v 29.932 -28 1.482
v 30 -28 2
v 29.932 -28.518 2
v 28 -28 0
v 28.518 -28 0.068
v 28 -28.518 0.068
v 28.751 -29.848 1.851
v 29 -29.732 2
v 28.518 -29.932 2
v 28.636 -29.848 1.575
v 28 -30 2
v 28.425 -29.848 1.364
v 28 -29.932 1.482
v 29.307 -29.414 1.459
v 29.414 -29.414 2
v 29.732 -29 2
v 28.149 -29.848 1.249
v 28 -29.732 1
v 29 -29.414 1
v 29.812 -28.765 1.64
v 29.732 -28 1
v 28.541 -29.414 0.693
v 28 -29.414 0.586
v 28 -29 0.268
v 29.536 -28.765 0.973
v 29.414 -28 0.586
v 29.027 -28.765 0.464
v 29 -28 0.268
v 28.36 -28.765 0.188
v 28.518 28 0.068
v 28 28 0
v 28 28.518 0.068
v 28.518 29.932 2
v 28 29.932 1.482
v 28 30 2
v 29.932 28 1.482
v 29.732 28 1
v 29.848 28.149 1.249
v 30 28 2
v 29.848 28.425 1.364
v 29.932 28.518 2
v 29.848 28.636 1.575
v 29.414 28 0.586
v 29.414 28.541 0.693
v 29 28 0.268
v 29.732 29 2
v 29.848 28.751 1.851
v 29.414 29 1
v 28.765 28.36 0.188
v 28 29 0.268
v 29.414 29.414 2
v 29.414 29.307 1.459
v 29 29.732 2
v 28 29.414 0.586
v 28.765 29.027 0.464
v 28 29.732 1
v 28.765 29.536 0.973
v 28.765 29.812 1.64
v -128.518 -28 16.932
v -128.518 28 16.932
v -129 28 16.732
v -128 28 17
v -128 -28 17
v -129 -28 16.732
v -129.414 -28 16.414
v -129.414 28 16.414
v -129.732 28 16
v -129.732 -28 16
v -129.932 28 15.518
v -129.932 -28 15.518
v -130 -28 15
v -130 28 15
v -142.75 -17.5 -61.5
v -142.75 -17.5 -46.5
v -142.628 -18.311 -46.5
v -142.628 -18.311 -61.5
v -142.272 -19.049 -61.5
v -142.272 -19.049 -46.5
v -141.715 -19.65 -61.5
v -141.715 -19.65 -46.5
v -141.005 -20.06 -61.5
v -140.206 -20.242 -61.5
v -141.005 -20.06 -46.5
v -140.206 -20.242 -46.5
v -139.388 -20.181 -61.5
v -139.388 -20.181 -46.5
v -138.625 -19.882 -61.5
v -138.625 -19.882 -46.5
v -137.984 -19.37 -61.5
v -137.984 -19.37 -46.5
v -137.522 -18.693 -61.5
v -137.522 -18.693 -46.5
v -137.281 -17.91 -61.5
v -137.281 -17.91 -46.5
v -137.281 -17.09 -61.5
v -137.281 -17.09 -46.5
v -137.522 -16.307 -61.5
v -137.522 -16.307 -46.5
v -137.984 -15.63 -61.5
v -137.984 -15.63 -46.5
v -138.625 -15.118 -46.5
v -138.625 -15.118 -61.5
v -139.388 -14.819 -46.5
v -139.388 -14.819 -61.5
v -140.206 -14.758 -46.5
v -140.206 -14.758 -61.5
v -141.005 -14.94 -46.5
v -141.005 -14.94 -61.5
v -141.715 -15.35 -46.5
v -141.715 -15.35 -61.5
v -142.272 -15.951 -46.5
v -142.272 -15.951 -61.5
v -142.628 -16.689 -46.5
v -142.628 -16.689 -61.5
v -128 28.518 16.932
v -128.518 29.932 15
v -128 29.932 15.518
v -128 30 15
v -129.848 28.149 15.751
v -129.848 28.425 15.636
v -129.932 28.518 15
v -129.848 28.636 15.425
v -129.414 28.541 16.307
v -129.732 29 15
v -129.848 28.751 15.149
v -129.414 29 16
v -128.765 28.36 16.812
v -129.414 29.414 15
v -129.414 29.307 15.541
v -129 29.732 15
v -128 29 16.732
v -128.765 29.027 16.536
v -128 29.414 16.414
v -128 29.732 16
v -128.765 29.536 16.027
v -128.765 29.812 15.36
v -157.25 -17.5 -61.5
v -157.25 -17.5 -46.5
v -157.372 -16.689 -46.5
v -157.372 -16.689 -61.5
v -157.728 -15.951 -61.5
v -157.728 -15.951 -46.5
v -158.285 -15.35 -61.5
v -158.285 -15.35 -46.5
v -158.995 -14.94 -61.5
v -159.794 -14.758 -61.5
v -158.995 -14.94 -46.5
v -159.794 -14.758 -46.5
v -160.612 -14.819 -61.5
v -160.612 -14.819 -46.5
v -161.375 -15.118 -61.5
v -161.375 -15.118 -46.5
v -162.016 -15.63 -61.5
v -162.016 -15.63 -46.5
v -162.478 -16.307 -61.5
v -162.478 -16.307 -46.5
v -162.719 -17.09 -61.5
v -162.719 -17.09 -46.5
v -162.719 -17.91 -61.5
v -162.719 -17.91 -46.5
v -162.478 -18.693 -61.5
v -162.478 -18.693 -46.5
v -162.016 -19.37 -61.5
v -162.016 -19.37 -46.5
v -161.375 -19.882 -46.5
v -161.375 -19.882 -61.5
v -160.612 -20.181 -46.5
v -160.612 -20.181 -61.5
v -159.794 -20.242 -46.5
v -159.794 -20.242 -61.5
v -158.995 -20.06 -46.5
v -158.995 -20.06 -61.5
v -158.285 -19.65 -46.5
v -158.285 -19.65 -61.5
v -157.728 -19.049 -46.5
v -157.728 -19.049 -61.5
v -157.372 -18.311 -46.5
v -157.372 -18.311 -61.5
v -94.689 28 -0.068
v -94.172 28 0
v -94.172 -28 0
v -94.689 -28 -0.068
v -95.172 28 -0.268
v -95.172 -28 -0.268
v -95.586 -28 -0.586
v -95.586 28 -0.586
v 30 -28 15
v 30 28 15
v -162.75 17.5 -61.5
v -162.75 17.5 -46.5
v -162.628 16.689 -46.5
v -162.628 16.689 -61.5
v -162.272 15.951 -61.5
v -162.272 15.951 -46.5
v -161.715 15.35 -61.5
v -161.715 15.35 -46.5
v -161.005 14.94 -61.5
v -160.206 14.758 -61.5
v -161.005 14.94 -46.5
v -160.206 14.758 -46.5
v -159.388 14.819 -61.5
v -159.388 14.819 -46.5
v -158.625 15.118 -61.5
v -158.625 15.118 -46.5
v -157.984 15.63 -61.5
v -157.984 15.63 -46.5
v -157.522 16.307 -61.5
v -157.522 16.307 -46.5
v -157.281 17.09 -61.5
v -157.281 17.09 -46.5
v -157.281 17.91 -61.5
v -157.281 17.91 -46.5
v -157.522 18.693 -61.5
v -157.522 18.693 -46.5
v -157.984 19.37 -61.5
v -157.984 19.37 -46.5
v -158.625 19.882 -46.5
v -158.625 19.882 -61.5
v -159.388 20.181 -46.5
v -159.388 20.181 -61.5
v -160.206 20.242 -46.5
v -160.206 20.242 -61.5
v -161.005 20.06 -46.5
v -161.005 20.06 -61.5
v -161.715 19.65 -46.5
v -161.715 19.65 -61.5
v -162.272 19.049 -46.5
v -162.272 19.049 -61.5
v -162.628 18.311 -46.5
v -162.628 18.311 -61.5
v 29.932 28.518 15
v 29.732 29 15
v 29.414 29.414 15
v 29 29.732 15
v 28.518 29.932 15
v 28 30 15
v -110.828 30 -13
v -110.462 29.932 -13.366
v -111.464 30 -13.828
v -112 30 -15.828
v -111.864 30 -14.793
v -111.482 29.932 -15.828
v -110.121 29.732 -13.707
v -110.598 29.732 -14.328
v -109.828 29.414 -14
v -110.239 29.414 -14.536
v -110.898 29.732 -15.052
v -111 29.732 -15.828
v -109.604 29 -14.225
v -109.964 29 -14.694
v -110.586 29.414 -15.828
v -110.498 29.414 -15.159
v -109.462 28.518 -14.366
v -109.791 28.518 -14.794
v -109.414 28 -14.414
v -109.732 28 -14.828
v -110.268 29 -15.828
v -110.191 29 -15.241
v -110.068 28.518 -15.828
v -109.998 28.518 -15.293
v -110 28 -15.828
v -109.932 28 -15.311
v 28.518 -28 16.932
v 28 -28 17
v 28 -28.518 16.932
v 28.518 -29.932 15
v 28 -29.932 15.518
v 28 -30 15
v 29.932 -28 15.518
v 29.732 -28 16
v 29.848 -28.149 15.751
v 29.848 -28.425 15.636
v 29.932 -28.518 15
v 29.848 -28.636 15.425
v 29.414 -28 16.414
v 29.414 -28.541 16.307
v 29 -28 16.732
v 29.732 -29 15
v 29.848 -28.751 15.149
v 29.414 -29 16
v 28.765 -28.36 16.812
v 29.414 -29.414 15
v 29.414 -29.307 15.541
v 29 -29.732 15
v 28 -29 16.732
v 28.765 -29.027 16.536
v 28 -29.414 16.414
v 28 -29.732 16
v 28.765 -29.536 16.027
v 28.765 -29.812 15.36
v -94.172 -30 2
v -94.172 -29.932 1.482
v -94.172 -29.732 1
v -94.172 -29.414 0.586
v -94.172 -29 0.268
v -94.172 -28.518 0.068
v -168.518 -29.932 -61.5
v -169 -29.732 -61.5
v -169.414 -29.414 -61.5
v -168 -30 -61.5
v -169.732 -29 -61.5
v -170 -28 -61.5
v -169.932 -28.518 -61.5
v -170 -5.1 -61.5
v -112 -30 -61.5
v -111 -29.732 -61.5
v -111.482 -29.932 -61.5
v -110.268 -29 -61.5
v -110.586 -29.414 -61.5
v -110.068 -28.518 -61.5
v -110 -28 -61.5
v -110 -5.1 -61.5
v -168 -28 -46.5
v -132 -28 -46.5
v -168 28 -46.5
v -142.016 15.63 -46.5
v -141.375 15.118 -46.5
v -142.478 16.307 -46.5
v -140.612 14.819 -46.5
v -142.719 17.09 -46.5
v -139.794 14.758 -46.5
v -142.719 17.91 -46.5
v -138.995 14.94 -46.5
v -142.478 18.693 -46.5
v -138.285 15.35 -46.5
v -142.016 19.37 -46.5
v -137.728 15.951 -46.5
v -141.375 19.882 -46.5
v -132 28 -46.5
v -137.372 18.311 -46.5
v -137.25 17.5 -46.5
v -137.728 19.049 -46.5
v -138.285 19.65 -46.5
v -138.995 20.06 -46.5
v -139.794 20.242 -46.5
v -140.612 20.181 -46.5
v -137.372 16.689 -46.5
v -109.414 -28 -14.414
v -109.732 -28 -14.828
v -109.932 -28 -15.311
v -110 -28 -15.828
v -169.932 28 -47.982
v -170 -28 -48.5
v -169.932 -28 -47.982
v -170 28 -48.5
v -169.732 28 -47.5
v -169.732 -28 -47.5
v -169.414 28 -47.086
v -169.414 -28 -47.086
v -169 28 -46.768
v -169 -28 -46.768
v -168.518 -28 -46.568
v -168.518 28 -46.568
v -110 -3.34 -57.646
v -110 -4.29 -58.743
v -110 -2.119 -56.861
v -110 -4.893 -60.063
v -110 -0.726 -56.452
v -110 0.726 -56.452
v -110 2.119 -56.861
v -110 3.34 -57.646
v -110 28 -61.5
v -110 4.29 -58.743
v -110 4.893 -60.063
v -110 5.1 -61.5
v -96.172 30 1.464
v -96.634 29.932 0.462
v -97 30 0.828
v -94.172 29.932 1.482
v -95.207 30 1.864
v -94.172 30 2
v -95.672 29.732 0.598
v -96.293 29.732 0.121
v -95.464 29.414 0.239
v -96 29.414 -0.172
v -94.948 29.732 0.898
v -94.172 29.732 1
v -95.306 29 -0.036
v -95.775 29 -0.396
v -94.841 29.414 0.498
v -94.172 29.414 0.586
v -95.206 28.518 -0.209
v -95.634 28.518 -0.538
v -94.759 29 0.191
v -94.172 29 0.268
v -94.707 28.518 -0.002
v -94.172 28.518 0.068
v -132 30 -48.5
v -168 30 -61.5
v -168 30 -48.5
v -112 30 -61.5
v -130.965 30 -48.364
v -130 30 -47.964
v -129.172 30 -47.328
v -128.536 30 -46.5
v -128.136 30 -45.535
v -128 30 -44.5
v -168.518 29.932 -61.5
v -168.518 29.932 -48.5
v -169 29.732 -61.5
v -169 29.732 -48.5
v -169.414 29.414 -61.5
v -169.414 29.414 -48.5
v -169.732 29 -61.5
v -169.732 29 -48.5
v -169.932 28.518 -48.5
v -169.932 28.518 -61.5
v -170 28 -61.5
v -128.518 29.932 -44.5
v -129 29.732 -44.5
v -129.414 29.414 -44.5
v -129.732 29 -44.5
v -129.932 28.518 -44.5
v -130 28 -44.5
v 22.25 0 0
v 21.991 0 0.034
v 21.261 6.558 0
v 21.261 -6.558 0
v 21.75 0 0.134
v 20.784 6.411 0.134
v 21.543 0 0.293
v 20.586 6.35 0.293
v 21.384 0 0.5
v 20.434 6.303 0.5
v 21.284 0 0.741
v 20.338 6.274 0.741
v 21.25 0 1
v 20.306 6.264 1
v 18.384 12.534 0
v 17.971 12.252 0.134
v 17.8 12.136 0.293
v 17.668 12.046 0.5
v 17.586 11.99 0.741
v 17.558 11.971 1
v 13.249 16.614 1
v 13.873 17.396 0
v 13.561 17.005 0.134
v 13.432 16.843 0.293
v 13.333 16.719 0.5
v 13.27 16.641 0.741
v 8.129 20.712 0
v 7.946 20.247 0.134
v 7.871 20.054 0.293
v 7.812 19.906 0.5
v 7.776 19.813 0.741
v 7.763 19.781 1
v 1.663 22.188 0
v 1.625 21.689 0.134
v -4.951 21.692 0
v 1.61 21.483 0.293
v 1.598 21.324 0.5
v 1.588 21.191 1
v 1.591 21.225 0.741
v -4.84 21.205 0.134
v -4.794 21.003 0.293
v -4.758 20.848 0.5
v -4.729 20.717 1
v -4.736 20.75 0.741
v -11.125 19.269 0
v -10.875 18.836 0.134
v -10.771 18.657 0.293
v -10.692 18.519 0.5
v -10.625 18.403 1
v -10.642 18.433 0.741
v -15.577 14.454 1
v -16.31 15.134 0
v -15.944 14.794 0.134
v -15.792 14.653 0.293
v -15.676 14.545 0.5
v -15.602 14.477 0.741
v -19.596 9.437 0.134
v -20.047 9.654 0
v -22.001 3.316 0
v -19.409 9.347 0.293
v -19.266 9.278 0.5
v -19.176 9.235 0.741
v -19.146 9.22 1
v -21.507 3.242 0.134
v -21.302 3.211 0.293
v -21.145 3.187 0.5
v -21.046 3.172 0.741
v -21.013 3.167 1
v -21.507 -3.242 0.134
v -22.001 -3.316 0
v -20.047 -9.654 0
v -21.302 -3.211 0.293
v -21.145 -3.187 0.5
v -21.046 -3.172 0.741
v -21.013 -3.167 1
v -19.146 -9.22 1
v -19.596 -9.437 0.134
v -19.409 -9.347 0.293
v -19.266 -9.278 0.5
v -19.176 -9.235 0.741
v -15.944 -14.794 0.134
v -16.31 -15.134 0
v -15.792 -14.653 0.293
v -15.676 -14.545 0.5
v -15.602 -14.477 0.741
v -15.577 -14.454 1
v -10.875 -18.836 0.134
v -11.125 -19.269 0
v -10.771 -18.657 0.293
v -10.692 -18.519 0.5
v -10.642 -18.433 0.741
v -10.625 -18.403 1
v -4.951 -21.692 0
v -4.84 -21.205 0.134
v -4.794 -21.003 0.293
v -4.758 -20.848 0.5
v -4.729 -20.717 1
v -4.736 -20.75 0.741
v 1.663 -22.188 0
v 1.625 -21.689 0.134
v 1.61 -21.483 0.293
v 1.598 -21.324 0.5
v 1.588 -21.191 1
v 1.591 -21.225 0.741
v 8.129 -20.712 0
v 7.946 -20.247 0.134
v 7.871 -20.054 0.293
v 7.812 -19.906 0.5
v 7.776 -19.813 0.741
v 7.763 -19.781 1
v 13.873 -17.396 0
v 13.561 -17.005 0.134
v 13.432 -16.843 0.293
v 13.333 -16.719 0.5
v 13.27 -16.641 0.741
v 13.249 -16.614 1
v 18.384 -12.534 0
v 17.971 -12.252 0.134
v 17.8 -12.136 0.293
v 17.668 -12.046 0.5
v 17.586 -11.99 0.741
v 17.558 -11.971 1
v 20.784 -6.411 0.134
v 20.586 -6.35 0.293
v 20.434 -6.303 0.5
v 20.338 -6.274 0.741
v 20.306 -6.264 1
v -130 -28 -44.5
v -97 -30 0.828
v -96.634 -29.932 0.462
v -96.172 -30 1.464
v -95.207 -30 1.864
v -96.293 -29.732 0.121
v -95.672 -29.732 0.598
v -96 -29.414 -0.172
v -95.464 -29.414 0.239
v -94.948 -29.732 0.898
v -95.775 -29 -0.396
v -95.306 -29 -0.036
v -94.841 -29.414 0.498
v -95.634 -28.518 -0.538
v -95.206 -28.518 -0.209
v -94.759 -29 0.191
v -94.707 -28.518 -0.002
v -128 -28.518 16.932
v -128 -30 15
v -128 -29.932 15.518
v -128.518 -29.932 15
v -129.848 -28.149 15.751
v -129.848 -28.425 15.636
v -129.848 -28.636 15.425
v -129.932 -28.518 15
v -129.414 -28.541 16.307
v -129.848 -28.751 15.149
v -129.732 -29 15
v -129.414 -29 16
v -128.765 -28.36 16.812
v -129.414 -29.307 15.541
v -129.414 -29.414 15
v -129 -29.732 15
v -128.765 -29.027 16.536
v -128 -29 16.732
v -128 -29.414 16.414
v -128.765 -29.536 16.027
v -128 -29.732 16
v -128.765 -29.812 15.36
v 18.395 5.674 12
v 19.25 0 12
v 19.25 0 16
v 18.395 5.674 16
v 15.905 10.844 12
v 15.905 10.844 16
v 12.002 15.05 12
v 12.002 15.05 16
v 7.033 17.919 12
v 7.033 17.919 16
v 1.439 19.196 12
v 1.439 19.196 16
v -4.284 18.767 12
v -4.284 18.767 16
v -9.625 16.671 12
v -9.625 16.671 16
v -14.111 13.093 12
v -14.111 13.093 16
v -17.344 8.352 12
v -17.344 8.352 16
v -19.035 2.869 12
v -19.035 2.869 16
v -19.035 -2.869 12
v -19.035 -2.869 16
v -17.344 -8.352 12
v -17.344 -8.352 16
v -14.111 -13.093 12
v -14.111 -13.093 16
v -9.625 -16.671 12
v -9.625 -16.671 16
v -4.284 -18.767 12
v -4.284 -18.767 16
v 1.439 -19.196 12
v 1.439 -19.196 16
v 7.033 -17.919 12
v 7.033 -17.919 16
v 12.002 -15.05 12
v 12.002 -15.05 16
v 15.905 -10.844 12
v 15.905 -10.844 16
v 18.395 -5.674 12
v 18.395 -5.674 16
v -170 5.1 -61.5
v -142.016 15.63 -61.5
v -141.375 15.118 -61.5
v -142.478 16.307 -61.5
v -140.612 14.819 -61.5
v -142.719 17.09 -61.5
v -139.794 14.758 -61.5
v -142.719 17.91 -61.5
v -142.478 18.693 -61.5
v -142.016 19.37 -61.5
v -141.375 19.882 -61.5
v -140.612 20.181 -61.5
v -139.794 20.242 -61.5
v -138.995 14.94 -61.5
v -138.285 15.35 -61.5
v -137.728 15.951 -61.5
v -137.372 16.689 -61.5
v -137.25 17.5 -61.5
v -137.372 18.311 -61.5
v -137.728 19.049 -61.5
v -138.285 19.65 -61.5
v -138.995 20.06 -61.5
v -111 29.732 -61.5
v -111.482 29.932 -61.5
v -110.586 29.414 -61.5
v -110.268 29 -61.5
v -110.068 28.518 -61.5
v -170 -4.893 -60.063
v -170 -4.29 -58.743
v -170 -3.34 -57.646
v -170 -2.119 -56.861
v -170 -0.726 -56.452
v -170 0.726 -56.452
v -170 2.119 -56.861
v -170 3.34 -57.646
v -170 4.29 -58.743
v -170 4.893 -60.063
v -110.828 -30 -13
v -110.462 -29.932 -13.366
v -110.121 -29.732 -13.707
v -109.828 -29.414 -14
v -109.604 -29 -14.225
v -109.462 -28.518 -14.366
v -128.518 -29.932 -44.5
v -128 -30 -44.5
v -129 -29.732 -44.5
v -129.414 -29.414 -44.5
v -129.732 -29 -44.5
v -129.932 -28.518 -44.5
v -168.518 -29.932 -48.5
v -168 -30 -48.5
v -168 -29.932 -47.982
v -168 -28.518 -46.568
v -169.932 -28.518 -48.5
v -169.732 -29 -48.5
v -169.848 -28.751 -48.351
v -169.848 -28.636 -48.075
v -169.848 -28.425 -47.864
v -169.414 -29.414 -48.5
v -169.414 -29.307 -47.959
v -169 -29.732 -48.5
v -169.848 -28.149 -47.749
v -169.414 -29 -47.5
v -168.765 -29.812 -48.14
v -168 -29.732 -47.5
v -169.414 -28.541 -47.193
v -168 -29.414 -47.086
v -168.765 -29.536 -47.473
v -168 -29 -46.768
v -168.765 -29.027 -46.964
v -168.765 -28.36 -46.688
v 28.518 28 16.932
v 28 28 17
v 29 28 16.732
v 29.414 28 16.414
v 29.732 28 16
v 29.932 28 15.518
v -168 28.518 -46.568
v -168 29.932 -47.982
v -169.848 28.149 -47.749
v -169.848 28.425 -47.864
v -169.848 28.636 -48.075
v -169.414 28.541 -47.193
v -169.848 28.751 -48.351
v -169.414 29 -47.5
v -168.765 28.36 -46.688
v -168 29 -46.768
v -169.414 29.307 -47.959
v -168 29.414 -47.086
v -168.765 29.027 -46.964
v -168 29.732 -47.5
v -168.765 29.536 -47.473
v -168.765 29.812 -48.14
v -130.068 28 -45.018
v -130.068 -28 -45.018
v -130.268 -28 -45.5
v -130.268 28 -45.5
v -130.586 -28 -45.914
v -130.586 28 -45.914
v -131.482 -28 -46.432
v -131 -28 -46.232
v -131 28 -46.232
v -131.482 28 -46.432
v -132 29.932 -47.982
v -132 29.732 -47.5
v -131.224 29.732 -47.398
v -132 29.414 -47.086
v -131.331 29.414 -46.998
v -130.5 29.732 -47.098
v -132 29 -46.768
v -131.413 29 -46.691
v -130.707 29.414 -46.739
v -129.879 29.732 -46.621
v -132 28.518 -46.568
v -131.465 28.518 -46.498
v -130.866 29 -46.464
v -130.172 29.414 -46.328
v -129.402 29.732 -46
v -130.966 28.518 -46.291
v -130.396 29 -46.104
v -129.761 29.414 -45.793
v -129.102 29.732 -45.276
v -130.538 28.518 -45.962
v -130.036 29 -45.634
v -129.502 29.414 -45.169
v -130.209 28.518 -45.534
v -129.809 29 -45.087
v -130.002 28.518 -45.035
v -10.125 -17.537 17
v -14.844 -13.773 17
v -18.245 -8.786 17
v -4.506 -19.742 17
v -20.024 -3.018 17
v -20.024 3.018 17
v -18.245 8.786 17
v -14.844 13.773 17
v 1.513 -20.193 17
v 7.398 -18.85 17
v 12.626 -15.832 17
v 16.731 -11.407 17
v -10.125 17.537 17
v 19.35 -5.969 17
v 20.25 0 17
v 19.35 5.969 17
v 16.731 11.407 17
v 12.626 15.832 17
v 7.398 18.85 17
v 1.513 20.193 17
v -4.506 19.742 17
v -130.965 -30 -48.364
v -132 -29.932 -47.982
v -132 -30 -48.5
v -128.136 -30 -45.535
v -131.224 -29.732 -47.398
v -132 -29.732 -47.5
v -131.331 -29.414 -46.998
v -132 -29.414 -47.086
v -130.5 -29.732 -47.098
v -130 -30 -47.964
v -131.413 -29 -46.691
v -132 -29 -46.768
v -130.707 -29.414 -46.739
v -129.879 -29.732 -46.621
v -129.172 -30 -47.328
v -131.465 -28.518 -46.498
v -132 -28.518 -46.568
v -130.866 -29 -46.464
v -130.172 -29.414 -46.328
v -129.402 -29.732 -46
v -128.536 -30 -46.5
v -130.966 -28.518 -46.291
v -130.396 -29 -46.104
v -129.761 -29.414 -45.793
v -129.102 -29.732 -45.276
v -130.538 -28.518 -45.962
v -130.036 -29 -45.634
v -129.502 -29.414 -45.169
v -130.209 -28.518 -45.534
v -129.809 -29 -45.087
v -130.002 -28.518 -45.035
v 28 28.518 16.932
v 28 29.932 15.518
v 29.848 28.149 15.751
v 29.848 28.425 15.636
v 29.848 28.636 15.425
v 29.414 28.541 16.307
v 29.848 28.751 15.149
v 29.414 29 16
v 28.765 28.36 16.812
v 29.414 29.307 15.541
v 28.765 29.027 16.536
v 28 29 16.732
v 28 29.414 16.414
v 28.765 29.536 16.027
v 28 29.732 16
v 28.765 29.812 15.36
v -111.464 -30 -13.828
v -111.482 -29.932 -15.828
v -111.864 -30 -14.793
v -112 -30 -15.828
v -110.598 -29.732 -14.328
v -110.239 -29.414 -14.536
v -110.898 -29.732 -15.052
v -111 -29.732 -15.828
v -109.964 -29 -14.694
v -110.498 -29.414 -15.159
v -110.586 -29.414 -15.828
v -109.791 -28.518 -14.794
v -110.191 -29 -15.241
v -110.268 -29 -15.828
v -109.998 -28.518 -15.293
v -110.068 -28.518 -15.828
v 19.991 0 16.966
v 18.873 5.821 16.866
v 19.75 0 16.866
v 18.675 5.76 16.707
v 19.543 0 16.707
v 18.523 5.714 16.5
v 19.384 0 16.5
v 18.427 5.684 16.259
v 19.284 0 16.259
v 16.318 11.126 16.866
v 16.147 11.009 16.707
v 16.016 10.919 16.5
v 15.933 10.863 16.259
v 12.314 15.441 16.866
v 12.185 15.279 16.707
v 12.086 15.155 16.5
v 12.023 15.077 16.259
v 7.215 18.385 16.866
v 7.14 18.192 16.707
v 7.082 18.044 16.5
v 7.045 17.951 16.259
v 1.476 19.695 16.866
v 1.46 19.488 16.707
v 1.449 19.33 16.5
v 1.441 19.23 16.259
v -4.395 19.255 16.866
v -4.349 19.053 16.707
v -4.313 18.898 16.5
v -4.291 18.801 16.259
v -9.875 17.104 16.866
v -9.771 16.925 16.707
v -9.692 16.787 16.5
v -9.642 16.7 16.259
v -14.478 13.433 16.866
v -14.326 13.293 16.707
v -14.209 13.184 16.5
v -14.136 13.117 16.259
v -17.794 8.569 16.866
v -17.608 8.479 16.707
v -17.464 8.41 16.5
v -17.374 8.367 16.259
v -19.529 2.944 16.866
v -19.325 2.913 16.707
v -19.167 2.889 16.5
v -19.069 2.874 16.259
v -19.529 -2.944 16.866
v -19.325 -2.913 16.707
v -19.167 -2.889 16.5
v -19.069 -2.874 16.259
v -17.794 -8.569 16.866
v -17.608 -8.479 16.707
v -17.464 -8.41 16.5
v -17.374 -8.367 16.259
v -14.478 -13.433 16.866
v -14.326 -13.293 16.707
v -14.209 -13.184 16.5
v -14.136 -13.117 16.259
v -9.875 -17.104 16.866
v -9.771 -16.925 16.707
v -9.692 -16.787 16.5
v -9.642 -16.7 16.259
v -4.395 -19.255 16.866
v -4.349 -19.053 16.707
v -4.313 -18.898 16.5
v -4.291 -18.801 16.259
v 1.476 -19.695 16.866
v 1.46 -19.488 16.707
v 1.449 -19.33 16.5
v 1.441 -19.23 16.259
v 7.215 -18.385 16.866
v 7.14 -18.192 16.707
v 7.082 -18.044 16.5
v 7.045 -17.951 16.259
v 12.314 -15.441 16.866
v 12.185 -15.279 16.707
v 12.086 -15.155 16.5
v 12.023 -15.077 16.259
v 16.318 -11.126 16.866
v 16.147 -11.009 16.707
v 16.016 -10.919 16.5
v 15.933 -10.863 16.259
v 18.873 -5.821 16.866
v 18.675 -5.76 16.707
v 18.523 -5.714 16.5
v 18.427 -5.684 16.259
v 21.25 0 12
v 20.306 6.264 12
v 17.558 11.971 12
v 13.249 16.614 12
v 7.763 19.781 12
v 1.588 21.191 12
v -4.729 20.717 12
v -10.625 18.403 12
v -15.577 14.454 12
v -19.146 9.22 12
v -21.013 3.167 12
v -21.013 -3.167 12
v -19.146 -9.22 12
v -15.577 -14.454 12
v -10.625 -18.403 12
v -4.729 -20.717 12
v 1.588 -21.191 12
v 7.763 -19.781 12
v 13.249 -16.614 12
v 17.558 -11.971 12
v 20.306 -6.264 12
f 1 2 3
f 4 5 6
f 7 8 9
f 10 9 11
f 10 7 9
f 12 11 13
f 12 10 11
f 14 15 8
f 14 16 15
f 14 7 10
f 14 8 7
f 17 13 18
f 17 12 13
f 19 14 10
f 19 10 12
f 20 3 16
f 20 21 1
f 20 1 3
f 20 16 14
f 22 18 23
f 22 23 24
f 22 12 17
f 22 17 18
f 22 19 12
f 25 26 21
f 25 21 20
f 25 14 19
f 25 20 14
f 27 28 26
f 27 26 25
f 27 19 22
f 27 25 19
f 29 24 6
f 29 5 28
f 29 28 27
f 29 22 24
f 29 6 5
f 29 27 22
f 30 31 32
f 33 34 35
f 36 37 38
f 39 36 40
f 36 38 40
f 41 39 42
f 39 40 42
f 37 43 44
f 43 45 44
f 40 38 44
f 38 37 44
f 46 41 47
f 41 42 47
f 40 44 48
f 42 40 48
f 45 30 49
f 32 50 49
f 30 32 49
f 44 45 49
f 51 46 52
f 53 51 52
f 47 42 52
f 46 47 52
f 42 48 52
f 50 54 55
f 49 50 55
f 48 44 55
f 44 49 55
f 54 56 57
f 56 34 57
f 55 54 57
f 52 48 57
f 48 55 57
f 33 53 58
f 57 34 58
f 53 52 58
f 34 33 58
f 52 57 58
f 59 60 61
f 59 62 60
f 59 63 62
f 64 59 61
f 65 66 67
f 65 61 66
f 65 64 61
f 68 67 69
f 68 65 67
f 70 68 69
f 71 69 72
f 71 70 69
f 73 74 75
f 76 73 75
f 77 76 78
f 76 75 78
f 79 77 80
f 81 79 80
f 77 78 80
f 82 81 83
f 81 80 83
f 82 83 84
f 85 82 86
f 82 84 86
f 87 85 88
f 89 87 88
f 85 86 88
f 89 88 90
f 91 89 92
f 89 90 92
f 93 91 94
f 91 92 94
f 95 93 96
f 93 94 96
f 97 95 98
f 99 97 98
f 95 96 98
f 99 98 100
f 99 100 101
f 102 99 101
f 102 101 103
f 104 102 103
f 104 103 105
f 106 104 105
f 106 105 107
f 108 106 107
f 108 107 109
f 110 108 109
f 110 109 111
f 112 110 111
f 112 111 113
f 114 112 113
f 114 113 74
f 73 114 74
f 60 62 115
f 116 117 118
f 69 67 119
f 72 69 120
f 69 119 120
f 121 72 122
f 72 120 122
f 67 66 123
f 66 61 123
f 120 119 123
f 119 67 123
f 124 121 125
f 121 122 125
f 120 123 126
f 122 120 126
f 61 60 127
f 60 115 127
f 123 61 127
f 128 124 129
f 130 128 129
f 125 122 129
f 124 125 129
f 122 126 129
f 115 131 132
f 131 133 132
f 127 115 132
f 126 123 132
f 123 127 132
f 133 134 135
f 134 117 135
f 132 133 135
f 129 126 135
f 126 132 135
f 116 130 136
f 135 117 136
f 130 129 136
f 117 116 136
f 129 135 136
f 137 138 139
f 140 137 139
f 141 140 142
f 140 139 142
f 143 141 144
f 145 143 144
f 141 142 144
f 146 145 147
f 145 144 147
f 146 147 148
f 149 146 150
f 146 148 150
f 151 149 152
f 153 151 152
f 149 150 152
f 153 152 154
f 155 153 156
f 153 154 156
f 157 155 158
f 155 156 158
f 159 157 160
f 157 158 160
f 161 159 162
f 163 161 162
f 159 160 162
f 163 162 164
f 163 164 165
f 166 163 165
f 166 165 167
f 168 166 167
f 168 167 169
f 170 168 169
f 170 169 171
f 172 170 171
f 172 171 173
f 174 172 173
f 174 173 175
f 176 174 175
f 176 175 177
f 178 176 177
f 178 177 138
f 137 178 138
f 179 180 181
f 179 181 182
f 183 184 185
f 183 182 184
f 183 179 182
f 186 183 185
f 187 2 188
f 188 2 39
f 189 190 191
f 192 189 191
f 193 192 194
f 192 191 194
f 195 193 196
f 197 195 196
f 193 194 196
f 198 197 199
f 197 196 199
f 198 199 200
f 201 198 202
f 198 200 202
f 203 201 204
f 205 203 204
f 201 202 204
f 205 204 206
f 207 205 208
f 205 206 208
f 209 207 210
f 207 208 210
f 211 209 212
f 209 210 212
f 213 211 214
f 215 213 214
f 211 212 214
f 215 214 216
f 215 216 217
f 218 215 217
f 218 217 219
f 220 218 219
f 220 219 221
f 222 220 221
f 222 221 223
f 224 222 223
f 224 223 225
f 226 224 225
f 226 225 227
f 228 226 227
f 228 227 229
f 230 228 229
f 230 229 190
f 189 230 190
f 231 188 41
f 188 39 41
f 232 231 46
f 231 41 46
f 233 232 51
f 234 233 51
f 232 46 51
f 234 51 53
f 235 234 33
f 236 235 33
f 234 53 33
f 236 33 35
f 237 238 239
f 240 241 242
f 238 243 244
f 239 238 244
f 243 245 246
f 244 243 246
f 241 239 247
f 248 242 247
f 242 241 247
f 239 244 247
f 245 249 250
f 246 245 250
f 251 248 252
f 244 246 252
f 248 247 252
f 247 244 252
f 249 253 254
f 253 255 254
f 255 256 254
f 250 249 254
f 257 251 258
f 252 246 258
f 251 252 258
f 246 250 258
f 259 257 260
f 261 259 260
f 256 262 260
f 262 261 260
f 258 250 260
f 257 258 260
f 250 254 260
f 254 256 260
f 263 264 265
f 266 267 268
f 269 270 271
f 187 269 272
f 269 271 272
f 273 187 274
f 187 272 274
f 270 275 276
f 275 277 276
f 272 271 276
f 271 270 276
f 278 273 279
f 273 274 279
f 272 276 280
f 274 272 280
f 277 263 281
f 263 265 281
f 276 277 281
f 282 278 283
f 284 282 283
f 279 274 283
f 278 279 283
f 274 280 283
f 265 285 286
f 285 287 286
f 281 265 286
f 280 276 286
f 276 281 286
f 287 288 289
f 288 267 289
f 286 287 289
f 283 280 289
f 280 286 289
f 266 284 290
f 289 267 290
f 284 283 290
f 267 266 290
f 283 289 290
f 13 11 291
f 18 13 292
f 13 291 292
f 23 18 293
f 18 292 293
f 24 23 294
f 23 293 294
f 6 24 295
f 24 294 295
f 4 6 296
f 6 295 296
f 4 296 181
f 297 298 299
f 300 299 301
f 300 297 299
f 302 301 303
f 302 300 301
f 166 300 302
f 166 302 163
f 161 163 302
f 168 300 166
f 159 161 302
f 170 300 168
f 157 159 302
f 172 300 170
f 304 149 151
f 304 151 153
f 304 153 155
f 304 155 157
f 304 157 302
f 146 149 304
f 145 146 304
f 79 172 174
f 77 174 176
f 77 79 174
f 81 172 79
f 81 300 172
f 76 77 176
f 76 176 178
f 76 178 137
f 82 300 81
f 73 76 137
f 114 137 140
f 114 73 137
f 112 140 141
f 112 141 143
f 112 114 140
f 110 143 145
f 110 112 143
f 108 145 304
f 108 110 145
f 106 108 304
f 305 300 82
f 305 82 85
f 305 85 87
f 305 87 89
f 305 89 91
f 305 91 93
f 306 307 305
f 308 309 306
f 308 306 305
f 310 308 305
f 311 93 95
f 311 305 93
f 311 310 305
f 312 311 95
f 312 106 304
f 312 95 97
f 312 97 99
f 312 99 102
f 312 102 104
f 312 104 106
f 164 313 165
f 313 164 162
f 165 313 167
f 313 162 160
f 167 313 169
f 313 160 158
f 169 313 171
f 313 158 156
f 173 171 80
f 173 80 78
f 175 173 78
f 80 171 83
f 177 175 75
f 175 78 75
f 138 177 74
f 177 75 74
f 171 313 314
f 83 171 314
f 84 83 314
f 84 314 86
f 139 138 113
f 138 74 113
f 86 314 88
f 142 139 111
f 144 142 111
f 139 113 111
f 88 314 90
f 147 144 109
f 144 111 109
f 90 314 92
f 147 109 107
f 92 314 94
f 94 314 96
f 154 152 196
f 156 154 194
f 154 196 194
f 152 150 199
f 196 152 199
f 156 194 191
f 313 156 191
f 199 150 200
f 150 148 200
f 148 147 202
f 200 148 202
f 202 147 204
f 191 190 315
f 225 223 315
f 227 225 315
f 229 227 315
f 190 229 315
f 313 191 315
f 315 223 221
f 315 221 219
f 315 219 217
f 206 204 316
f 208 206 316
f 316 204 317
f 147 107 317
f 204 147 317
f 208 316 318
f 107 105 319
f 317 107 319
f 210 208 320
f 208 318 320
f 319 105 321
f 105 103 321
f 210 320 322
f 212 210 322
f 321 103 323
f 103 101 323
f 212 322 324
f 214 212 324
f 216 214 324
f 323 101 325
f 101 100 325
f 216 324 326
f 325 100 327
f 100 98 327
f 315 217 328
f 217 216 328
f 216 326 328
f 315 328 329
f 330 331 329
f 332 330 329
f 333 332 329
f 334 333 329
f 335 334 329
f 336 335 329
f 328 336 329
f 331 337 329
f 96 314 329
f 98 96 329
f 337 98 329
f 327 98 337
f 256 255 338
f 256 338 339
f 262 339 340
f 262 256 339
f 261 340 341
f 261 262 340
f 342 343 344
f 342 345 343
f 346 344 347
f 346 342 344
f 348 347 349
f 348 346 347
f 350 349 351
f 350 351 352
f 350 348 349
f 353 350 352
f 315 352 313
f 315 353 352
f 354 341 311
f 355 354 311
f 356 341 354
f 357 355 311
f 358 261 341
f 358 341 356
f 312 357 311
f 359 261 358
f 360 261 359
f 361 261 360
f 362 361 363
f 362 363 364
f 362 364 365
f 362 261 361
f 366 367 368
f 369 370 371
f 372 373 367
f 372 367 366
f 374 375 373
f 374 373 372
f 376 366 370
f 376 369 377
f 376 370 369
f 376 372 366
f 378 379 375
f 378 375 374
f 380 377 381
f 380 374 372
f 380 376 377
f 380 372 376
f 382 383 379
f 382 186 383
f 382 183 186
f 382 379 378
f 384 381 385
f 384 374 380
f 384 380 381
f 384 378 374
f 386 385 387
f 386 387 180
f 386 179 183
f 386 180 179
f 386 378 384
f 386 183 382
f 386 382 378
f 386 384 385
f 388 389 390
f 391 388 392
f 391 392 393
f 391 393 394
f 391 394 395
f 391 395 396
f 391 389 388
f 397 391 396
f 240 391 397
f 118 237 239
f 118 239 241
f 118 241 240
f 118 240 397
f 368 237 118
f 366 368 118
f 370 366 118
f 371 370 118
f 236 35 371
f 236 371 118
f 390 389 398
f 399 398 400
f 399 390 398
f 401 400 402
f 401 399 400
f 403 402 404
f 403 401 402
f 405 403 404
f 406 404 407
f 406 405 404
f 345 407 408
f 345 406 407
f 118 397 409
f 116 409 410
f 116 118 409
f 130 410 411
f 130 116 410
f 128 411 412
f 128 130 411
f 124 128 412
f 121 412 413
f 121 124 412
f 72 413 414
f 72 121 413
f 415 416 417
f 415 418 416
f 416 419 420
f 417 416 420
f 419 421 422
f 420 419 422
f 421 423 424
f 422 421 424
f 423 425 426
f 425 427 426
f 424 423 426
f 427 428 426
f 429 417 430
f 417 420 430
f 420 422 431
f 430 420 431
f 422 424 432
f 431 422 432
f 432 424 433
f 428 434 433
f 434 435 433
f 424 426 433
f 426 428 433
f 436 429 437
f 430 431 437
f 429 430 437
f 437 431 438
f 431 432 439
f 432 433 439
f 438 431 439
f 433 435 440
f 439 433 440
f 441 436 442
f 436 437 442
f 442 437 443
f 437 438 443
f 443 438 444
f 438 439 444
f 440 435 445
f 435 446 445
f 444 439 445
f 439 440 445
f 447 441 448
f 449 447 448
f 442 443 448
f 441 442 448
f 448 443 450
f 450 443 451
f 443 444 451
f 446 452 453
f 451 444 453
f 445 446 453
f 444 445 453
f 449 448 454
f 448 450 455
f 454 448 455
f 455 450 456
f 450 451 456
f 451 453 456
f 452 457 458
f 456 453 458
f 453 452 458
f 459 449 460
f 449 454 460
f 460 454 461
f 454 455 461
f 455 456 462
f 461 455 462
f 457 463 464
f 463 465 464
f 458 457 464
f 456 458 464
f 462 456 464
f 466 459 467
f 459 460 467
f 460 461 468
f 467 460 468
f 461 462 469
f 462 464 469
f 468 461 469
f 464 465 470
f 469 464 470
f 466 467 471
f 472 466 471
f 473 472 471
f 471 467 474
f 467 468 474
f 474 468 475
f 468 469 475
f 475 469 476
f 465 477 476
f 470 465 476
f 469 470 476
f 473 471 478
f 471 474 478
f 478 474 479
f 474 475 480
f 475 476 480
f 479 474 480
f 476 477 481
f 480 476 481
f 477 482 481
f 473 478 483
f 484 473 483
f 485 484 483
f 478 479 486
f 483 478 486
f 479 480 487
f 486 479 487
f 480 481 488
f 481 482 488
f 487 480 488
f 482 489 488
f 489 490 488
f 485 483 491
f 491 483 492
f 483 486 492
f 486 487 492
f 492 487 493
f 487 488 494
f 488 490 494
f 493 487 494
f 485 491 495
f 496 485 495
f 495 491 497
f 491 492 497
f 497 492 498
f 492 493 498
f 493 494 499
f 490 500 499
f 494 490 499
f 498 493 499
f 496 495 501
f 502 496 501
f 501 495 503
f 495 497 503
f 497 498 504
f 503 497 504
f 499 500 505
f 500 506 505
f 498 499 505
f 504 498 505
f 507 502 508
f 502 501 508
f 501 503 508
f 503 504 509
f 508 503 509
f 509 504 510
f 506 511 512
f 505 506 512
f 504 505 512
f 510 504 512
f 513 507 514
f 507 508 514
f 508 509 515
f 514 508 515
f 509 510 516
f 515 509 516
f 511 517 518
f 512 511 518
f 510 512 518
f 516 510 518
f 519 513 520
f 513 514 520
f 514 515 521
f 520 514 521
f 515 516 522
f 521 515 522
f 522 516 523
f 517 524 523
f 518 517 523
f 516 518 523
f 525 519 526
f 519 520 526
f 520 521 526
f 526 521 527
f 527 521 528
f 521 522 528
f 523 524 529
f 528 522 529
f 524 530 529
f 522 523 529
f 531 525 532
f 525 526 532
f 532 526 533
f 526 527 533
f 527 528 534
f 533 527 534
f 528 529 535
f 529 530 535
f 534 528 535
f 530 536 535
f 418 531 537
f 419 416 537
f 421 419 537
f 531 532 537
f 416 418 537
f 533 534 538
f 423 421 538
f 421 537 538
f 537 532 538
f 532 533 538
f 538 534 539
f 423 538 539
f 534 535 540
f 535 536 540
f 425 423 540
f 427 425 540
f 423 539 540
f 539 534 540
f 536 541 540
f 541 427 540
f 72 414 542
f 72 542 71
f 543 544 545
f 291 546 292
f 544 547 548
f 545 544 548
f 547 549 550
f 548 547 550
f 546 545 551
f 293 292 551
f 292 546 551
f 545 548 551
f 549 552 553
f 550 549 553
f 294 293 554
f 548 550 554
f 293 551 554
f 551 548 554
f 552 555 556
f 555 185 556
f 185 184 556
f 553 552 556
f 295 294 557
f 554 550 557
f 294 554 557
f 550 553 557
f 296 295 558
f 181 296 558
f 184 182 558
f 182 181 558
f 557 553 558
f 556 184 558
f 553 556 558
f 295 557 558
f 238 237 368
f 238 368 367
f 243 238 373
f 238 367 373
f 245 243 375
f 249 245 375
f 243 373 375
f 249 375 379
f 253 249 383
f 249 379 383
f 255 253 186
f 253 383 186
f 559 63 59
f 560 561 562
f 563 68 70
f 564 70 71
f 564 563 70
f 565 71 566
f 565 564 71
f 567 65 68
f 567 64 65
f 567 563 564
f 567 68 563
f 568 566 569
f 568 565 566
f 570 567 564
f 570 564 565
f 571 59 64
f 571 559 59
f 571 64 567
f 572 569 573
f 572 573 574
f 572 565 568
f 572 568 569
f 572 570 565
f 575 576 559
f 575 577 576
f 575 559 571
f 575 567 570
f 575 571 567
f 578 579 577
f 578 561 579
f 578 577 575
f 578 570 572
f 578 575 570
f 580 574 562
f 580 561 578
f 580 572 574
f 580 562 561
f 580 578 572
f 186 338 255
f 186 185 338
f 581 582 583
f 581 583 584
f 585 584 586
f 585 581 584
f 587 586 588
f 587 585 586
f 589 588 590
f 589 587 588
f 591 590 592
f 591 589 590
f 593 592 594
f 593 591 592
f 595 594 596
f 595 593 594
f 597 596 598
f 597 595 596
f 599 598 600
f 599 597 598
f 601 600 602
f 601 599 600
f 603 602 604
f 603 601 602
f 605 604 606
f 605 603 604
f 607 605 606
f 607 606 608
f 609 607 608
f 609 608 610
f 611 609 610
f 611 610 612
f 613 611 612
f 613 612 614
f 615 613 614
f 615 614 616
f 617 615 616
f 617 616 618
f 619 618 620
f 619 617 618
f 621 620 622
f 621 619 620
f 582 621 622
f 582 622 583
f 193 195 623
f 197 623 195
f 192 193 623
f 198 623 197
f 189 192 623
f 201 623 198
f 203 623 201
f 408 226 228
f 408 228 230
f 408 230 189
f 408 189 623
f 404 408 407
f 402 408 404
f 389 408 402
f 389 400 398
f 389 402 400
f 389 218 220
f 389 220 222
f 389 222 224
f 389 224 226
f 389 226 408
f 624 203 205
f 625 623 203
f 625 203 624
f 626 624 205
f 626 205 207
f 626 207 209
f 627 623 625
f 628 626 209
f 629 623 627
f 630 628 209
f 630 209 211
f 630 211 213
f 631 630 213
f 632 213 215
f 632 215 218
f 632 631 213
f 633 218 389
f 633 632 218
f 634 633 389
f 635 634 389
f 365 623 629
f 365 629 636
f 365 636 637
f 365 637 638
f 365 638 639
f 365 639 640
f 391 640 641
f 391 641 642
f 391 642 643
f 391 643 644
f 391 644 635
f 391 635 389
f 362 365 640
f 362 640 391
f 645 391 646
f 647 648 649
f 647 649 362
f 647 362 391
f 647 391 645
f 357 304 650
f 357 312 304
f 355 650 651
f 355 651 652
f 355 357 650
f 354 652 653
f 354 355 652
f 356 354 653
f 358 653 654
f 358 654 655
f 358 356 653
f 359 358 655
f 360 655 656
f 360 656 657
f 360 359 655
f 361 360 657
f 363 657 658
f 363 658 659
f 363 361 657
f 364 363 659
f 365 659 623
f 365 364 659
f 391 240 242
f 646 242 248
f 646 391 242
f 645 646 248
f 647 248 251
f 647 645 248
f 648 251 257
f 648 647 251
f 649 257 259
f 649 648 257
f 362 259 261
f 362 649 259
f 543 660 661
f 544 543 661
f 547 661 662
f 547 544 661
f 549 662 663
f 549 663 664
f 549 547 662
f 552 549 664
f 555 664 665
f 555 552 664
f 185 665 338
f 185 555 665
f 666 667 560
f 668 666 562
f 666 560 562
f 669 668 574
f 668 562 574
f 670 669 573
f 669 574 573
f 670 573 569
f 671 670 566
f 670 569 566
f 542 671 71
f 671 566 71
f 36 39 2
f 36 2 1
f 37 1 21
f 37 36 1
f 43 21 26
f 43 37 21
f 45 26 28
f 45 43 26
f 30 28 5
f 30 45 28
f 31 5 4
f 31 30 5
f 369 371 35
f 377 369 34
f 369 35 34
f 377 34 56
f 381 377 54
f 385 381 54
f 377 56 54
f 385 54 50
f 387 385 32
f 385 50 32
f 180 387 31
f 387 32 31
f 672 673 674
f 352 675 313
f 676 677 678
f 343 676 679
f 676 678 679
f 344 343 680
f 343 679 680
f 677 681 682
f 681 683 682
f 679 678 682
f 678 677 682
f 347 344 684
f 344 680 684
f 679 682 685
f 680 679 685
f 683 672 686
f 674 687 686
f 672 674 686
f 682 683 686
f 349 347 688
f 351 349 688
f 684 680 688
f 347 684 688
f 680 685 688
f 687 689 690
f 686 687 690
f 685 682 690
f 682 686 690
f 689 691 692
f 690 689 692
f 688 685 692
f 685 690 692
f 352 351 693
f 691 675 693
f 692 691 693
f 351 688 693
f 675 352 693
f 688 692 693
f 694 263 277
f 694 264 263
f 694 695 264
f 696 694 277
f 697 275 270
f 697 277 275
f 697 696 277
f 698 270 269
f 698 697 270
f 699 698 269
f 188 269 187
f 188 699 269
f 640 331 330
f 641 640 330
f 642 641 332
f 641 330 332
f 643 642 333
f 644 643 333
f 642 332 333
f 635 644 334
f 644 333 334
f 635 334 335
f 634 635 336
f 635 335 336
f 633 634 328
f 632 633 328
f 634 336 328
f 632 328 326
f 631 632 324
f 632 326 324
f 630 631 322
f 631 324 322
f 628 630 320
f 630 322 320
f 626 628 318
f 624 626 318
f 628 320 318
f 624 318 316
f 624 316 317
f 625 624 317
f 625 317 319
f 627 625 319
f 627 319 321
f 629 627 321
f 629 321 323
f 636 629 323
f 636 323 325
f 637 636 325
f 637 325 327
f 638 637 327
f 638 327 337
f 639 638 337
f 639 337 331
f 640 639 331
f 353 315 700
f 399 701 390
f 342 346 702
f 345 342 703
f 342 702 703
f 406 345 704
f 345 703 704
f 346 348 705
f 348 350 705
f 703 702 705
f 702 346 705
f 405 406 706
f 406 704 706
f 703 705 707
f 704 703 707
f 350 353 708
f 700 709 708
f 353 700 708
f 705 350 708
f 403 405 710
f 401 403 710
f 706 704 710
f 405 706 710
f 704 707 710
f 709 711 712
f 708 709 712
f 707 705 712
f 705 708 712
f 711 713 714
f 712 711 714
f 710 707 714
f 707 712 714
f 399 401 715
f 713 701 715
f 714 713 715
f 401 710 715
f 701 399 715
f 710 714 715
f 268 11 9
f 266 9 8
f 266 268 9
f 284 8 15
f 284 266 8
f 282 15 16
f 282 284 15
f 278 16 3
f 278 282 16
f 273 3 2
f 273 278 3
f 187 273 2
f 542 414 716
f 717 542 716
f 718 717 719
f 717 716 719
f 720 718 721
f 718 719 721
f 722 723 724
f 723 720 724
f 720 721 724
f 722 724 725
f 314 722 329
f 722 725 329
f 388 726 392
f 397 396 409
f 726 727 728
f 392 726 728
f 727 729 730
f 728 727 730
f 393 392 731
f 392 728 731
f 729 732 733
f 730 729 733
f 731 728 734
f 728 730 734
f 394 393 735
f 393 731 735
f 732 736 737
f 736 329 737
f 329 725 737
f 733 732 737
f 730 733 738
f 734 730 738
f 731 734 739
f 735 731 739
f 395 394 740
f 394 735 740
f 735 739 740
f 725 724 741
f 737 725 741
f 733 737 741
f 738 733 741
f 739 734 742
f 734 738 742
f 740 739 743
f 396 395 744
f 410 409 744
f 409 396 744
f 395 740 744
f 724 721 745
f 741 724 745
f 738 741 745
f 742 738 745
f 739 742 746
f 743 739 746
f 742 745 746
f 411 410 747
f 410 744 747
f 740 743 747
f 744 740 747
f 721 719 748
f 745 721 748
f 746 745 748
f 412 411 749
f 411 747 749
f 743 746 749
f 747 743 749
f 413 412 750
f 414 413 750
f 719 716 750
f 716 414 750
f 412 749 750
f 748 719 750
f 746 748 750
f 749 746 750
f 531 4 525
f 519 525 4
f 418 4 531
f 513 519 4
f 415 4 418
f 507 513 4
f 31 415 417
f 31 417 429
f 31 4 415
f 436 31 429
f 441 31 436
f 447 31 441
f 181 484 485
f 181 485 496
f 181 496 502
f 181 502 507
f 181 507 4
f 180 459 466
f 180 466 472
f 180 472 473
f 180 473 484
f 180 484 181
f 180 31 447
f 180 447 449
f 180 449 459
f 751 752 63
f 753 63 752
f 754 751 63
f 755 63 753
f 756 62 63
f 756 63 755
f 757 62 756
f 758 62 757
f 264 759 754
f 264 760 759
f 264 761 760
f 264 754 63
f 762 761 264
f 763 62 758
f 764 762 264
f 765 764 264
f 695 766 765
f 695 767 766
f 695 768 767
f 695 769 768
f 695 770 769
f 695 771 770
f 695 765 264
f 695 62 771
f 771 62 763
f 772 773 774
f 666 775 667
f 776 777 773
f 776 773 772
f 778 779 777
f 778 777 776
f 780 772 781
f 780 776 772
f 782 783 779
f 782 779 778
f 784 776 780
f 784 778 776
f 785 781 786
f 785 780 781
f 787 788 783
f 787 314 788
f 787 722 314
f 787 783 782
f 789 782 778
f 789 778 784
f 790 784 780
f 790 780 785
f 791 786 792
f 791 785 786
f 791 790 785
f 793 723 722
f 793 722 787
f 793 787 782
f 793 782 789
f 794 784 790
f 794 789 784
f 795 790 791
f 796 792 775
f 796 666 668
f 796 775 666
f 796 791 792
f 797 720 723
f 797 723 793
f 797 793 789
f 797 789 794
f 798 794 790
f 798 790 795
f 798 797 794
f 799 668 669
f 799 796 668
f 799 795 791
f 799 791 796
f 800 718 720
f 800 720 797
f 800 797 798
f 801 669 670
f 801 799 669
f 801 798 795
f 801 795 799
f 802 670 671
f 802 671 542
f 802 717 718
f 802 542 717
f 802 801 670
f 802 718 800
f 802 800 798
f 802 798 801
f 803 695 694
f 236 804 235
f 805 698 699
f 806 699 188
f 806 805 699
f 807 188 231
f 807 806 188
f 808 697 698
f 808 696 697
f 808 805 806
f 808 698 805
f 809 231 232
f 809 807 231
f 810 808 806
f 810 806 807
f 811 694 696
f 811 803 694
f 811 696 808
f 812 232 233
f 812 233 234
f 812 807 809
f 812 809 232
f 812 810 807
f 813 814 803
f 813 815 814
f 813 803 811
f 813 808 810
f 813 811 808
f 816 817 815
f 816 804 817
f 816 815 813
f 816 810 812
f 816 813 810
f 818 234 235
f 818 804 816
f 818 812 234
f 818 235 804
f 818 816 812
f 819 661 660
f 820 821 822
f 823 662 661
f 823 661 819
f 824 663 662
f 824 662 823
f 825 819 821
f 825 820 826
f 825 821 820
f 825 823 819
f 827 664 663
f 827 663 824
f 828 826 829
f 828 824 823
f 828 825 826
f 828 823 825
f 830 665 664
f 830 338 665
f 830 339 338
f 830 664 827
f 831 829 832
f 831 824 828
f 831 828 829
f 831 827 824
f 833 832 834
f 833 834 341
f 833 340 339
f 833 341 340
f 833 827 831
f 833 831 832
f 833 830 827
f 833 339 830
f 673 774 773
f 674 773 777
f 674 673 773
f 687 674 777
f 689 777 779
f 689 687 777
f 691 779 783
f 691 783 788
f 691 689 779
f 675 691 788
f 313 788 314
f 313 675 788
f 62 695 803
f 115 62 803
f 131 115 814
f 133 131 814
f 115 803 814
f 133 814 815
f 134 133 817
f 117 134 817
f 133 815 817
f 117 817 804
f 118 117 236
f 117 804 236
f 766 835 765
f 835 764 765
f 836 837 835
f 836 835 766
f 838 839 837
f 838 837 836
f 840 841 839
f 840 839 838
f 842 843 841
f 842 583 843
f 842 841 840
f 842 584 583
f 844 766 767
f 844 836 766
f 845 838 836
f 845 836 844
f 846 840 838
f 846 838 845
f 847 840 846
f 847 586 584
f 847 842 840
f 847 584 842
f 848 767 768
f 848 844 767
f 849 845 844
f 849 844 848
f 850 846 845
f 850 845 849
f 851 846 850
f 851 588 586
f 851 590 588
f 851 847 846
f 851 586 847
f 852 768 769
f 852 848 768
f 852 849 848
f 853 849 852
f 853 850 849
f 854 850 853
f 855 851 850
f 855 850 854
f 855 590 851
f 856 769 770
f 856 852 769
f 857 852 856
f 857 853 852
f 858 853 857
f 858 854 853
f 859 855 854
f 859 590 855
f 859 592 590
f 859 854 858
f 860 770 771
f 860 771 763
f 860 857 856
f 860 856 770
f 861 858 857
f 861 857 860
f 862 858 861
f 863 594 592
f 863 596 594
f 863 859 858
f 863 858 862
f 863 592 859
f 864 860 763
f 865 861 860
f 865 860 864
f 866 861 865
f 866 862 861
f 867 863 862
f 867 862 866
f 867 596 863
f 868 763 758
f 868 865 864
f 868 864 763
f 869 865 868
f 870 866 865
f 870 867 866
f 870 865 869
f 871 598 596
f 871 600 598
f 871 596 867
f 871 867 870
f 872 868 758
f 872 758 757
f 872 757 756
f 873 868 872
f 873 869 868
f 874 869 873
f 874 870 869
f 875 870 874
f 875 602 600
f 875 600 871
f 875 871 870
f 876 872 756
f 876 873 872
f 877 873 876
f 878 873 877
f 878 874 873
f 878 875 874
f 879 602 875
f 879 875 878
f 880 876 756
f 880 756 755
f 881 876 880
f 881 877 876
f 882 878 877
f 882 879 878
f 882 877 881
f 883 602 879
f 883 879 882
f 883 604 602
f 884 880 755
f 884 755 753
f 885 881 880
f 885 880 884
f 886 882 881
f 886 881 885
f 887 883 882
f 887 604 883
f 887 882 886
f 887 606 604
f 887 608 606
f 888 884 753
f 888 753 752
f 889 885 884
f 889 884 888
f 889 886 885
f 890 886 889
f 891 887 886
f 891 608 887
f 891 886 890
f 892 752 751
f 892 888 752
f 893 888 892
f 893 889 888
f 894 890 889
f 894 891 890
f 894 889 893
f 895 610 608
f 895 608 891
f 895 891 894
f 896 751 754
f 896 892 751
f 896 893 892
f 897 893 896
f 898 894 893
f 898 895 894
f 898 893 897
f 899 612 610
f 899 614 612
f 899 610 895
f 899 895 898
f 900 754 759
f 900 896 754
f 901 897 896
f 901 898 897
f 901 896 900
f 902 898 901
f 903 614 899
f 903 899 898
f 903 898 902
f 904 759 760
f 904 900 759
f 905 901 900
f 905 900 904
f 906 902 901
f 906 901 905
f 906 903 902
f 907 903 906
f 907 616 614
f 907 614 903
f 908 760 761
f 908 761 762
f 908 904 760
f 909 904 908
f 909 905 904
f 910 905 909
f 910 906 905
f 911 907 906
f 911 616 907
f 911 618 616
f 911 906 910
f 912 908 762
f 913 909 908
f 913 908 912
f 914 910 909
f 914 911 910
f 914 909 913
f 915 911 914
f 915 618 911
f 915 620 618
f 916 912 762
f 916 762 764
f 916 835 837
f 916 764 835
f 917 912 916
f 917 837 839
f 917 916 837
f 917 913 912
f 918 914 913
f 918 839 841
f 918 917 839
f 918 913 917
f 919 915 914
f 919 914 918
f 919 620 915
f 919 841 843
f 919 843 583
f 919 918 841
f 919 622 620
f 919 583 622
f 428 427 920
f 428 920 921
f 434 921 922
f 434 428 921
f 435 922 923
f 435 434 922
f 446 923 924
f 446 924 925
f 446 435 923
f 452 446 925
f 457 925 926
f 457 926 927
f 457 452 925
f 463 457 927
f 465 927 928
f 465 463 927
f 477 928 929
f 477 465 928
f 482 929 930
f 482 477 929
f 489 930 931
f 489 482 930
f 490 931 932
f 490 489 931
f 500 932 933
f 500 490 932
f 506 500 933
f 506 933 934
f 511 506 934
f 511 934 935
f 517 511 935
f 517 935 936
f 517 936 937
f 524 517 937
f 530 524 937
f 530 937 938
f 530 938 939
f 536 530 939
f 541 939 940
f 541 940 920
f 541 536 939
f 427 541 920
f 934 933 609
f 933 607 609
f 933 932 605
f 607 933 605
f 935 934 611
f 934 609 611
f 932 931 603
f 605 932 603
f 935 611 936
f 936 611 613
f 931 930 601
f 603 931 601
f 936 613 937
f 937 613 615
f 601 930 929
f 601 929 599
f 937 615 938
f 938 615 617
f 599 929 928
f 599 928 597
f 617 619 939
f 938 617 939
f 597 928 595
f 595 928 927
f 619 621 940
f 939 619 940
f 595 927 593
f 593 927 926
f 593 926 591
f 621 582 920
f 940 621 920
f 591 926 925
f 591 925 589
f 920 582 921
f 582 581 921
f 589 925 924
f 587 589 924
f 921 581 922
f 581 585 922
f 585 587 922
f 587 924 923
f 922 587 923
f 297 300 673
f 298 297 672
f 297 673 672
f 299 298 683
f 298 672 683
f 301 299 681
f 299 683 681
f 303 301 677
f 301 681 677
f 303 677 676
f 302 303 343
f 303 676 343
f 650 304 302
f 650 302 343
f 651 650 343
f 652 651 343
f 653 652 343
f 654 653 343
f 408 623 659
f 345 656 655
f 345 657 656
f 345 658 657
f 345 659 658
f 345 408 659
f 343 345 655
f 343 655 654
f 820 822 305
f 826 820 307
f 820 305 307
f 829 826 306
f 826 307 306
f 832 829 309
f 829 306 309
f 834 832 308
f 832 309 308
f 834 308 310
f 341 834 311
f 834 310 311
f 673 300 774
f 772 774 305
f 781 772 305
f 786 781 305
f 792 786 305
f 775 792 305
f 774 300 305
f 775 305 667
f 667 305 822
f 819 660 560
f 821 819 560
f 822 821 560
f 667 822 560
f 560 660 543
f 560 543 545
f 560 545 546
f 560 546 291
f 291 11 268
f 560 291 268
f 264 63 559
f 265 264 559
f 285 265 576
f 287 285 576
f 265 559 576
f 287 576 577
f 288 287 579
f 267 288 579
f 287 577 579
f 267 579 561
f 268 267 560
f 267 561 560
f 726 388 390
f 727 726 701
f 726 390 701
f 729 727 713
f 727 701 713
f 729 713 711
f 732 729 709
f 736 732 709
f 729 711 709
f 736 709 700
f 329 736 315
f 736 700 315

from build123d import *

# Parameters (mm, degrees)
SKETCH1_W               = 60
SKETCH1_H               = 60
SKETCH1_R               = 21.25
BOSS_EXTRUDE1_DEPTH     = 12
SKETCH2_W               = 60
SKETCH2_H               = 60
SKETCH2_R               = 19.25
BOSS_EXTRUDE2_DEPTH     = 5
BOSS_EXTRUDE3_DEPTH     = 30
SKETCH4_W               = 15
SKETCH4_H               = 60
BOSS_EXTRUDE4_DEPTH     = 40
CUT_EXTRUDE1_DEPTH      = 212.381763641
CUT_EXTRUDE1_DEPTH_BACK = 212.381763641
SKETCH5_R               = 5.1
SKETCH6_R               = 2.75
CUT_EXTRUDE2_DEPTH      = 184.935450634
CHAMFER1_SIZE           = 15
FILLET1_R               = 1
FILLET2_R               = 1
FILLET3_R               = 2


with BuildPart() as part:
    # Sketch1 → Boss-Extrude1 (new body)
    with BuildSketch(Plane.XY):
        Rectangle(SKETCH1_W, SKETCH1_H)
        Circle(SKETCH1_R, mode=Mode.SUBTRACT)
    extrude(amount=BOSS_EXTRUDE1_DEPTH)

    # Sketch2 → Boss-Extrude2 (add)
    with BuildSketch(Plane.XY.offset(12)):
        Rectangle(SKETCH2_W, SKETCH2_H)
        Circle(SKETCH2_R, mode=Mode.SUBTRACT)
    extrude(amount=BOSS_EXTRUDE2_DEPTH)

    # Sketch3 → Boss-Extrude3 (add, symmetric)
    with BuildSketch(Plane(origin=(0, 0, 0), x_dir=(1, 0, 0), z_dir=(0, 1, 0))):
        Polygon((-30, 0), (-110, 0), (-110, 61.5), (-130, 61.5), (-130, -17), (-30, -17), align=None)
    extrude(amount=BOSS_EXTRUDE3_DEPTH, both=True)

    # Sketch4 → Boss-Extrude4 (add)
    with BuildSketch(Plane.ZY.offset(130)):
        with Locations((-54, 0)):
            Rectangle(SKETCH4_W, SKETCH4_H)
    extrude(amount=BOSS_EXTRUDE4_DEPTH)

    # Sketch5 → Cut-Extrude1 (cut, two sides: drawn at the far end of the back side and taken through both)
    with BuildSketch(Plane.ZY.offset(170).offset(-CUT_EXTRUDE1_DEPTH_BACK)):
        with Locations((-61.5, 0)):
            Circle(SKETCH5_R)
    extrude(amount=CUT_EXTRUDE1_DEPTH + CUT_EXTRUDE1_DEPTH_BACK, mode=Mode.SUBTRACT)

    # Sketch6 → Cut-Extrude2 (cut, through all)
    with BuildSketch(Plane.XY.offset(-46.5)):
        with Locations((-140, 17.5)):
            Circle(SKETCH6_R)
        with Locations(Location((-140, -17.5, 0), (0, 0, 180))):
            Circle(SKETCH6_R)
        with Locations((-160, -17.5)):
            Circle(SKETCH6_R)
        with Locations(Location((-160, 17.5, 0), (0, 0, 180))):
            Circle(SKETCH6_R)
    extrude(amount=-CUT_EXTRUDE2_DEPTH, mode=Mode.SUBTRACT)

    # Chamfer1
    chamfer1_edges = [part.edges().sort_by_distance(p)[0] for p in [
        (-110, 0, 0),
    ]]
    chamfer(chamfer1_edges, length=CHAMFER1_SIZE)

    # Fillet1
    fillet1_edges = [part.edges().sort_by_distance(p)[0] for p in [
        (-21.25, 0, 0),
    ]]
    fillet(fillet1_edges, radius=FILLET1_R)

    # Fillet2
    fillet2_edges = [part.edges().sort_by_distance(p)[0] for p in [
        (-19.25, 0, 17),
    ]]
    fillet(fillet2_edges, radius=FILLET2_R)

    # Fillet3
    fillet3_edges = [part.edges().sort_by_distance(p)[0] for p in [
        (-50, 30, 17),
        (-50, -30, 17),
        (30, 0, 17),
        (-130, 0, 17),
        (-130, -30, -14.75),
        (-130, 30, -14.75),
        (-130, 0, -46.5),
        (-150, -30, -46.5),
        (-150, 30, -46.5),
        (-170, -30, -54),
        (-170, 0, -46.5),
        (-170, 30, -54),
        (-32.5, 30, 0),
        (30, 0, 0),
        (30, -30, 8.5),
        (30, 30, 8.5),
        (-110, 30, -38.25),
        (-110, -30, -38.25),
        (-110, 0, -15),
        (-32.5, -30, 0),
        (-95, 0, 0),
        (-102.5, -30, -7.5),
        (-102.5, 30, -7.5),
    ]]
    fillet(fillet3_edges, radius=FILLET3_R)


solid = part.part
